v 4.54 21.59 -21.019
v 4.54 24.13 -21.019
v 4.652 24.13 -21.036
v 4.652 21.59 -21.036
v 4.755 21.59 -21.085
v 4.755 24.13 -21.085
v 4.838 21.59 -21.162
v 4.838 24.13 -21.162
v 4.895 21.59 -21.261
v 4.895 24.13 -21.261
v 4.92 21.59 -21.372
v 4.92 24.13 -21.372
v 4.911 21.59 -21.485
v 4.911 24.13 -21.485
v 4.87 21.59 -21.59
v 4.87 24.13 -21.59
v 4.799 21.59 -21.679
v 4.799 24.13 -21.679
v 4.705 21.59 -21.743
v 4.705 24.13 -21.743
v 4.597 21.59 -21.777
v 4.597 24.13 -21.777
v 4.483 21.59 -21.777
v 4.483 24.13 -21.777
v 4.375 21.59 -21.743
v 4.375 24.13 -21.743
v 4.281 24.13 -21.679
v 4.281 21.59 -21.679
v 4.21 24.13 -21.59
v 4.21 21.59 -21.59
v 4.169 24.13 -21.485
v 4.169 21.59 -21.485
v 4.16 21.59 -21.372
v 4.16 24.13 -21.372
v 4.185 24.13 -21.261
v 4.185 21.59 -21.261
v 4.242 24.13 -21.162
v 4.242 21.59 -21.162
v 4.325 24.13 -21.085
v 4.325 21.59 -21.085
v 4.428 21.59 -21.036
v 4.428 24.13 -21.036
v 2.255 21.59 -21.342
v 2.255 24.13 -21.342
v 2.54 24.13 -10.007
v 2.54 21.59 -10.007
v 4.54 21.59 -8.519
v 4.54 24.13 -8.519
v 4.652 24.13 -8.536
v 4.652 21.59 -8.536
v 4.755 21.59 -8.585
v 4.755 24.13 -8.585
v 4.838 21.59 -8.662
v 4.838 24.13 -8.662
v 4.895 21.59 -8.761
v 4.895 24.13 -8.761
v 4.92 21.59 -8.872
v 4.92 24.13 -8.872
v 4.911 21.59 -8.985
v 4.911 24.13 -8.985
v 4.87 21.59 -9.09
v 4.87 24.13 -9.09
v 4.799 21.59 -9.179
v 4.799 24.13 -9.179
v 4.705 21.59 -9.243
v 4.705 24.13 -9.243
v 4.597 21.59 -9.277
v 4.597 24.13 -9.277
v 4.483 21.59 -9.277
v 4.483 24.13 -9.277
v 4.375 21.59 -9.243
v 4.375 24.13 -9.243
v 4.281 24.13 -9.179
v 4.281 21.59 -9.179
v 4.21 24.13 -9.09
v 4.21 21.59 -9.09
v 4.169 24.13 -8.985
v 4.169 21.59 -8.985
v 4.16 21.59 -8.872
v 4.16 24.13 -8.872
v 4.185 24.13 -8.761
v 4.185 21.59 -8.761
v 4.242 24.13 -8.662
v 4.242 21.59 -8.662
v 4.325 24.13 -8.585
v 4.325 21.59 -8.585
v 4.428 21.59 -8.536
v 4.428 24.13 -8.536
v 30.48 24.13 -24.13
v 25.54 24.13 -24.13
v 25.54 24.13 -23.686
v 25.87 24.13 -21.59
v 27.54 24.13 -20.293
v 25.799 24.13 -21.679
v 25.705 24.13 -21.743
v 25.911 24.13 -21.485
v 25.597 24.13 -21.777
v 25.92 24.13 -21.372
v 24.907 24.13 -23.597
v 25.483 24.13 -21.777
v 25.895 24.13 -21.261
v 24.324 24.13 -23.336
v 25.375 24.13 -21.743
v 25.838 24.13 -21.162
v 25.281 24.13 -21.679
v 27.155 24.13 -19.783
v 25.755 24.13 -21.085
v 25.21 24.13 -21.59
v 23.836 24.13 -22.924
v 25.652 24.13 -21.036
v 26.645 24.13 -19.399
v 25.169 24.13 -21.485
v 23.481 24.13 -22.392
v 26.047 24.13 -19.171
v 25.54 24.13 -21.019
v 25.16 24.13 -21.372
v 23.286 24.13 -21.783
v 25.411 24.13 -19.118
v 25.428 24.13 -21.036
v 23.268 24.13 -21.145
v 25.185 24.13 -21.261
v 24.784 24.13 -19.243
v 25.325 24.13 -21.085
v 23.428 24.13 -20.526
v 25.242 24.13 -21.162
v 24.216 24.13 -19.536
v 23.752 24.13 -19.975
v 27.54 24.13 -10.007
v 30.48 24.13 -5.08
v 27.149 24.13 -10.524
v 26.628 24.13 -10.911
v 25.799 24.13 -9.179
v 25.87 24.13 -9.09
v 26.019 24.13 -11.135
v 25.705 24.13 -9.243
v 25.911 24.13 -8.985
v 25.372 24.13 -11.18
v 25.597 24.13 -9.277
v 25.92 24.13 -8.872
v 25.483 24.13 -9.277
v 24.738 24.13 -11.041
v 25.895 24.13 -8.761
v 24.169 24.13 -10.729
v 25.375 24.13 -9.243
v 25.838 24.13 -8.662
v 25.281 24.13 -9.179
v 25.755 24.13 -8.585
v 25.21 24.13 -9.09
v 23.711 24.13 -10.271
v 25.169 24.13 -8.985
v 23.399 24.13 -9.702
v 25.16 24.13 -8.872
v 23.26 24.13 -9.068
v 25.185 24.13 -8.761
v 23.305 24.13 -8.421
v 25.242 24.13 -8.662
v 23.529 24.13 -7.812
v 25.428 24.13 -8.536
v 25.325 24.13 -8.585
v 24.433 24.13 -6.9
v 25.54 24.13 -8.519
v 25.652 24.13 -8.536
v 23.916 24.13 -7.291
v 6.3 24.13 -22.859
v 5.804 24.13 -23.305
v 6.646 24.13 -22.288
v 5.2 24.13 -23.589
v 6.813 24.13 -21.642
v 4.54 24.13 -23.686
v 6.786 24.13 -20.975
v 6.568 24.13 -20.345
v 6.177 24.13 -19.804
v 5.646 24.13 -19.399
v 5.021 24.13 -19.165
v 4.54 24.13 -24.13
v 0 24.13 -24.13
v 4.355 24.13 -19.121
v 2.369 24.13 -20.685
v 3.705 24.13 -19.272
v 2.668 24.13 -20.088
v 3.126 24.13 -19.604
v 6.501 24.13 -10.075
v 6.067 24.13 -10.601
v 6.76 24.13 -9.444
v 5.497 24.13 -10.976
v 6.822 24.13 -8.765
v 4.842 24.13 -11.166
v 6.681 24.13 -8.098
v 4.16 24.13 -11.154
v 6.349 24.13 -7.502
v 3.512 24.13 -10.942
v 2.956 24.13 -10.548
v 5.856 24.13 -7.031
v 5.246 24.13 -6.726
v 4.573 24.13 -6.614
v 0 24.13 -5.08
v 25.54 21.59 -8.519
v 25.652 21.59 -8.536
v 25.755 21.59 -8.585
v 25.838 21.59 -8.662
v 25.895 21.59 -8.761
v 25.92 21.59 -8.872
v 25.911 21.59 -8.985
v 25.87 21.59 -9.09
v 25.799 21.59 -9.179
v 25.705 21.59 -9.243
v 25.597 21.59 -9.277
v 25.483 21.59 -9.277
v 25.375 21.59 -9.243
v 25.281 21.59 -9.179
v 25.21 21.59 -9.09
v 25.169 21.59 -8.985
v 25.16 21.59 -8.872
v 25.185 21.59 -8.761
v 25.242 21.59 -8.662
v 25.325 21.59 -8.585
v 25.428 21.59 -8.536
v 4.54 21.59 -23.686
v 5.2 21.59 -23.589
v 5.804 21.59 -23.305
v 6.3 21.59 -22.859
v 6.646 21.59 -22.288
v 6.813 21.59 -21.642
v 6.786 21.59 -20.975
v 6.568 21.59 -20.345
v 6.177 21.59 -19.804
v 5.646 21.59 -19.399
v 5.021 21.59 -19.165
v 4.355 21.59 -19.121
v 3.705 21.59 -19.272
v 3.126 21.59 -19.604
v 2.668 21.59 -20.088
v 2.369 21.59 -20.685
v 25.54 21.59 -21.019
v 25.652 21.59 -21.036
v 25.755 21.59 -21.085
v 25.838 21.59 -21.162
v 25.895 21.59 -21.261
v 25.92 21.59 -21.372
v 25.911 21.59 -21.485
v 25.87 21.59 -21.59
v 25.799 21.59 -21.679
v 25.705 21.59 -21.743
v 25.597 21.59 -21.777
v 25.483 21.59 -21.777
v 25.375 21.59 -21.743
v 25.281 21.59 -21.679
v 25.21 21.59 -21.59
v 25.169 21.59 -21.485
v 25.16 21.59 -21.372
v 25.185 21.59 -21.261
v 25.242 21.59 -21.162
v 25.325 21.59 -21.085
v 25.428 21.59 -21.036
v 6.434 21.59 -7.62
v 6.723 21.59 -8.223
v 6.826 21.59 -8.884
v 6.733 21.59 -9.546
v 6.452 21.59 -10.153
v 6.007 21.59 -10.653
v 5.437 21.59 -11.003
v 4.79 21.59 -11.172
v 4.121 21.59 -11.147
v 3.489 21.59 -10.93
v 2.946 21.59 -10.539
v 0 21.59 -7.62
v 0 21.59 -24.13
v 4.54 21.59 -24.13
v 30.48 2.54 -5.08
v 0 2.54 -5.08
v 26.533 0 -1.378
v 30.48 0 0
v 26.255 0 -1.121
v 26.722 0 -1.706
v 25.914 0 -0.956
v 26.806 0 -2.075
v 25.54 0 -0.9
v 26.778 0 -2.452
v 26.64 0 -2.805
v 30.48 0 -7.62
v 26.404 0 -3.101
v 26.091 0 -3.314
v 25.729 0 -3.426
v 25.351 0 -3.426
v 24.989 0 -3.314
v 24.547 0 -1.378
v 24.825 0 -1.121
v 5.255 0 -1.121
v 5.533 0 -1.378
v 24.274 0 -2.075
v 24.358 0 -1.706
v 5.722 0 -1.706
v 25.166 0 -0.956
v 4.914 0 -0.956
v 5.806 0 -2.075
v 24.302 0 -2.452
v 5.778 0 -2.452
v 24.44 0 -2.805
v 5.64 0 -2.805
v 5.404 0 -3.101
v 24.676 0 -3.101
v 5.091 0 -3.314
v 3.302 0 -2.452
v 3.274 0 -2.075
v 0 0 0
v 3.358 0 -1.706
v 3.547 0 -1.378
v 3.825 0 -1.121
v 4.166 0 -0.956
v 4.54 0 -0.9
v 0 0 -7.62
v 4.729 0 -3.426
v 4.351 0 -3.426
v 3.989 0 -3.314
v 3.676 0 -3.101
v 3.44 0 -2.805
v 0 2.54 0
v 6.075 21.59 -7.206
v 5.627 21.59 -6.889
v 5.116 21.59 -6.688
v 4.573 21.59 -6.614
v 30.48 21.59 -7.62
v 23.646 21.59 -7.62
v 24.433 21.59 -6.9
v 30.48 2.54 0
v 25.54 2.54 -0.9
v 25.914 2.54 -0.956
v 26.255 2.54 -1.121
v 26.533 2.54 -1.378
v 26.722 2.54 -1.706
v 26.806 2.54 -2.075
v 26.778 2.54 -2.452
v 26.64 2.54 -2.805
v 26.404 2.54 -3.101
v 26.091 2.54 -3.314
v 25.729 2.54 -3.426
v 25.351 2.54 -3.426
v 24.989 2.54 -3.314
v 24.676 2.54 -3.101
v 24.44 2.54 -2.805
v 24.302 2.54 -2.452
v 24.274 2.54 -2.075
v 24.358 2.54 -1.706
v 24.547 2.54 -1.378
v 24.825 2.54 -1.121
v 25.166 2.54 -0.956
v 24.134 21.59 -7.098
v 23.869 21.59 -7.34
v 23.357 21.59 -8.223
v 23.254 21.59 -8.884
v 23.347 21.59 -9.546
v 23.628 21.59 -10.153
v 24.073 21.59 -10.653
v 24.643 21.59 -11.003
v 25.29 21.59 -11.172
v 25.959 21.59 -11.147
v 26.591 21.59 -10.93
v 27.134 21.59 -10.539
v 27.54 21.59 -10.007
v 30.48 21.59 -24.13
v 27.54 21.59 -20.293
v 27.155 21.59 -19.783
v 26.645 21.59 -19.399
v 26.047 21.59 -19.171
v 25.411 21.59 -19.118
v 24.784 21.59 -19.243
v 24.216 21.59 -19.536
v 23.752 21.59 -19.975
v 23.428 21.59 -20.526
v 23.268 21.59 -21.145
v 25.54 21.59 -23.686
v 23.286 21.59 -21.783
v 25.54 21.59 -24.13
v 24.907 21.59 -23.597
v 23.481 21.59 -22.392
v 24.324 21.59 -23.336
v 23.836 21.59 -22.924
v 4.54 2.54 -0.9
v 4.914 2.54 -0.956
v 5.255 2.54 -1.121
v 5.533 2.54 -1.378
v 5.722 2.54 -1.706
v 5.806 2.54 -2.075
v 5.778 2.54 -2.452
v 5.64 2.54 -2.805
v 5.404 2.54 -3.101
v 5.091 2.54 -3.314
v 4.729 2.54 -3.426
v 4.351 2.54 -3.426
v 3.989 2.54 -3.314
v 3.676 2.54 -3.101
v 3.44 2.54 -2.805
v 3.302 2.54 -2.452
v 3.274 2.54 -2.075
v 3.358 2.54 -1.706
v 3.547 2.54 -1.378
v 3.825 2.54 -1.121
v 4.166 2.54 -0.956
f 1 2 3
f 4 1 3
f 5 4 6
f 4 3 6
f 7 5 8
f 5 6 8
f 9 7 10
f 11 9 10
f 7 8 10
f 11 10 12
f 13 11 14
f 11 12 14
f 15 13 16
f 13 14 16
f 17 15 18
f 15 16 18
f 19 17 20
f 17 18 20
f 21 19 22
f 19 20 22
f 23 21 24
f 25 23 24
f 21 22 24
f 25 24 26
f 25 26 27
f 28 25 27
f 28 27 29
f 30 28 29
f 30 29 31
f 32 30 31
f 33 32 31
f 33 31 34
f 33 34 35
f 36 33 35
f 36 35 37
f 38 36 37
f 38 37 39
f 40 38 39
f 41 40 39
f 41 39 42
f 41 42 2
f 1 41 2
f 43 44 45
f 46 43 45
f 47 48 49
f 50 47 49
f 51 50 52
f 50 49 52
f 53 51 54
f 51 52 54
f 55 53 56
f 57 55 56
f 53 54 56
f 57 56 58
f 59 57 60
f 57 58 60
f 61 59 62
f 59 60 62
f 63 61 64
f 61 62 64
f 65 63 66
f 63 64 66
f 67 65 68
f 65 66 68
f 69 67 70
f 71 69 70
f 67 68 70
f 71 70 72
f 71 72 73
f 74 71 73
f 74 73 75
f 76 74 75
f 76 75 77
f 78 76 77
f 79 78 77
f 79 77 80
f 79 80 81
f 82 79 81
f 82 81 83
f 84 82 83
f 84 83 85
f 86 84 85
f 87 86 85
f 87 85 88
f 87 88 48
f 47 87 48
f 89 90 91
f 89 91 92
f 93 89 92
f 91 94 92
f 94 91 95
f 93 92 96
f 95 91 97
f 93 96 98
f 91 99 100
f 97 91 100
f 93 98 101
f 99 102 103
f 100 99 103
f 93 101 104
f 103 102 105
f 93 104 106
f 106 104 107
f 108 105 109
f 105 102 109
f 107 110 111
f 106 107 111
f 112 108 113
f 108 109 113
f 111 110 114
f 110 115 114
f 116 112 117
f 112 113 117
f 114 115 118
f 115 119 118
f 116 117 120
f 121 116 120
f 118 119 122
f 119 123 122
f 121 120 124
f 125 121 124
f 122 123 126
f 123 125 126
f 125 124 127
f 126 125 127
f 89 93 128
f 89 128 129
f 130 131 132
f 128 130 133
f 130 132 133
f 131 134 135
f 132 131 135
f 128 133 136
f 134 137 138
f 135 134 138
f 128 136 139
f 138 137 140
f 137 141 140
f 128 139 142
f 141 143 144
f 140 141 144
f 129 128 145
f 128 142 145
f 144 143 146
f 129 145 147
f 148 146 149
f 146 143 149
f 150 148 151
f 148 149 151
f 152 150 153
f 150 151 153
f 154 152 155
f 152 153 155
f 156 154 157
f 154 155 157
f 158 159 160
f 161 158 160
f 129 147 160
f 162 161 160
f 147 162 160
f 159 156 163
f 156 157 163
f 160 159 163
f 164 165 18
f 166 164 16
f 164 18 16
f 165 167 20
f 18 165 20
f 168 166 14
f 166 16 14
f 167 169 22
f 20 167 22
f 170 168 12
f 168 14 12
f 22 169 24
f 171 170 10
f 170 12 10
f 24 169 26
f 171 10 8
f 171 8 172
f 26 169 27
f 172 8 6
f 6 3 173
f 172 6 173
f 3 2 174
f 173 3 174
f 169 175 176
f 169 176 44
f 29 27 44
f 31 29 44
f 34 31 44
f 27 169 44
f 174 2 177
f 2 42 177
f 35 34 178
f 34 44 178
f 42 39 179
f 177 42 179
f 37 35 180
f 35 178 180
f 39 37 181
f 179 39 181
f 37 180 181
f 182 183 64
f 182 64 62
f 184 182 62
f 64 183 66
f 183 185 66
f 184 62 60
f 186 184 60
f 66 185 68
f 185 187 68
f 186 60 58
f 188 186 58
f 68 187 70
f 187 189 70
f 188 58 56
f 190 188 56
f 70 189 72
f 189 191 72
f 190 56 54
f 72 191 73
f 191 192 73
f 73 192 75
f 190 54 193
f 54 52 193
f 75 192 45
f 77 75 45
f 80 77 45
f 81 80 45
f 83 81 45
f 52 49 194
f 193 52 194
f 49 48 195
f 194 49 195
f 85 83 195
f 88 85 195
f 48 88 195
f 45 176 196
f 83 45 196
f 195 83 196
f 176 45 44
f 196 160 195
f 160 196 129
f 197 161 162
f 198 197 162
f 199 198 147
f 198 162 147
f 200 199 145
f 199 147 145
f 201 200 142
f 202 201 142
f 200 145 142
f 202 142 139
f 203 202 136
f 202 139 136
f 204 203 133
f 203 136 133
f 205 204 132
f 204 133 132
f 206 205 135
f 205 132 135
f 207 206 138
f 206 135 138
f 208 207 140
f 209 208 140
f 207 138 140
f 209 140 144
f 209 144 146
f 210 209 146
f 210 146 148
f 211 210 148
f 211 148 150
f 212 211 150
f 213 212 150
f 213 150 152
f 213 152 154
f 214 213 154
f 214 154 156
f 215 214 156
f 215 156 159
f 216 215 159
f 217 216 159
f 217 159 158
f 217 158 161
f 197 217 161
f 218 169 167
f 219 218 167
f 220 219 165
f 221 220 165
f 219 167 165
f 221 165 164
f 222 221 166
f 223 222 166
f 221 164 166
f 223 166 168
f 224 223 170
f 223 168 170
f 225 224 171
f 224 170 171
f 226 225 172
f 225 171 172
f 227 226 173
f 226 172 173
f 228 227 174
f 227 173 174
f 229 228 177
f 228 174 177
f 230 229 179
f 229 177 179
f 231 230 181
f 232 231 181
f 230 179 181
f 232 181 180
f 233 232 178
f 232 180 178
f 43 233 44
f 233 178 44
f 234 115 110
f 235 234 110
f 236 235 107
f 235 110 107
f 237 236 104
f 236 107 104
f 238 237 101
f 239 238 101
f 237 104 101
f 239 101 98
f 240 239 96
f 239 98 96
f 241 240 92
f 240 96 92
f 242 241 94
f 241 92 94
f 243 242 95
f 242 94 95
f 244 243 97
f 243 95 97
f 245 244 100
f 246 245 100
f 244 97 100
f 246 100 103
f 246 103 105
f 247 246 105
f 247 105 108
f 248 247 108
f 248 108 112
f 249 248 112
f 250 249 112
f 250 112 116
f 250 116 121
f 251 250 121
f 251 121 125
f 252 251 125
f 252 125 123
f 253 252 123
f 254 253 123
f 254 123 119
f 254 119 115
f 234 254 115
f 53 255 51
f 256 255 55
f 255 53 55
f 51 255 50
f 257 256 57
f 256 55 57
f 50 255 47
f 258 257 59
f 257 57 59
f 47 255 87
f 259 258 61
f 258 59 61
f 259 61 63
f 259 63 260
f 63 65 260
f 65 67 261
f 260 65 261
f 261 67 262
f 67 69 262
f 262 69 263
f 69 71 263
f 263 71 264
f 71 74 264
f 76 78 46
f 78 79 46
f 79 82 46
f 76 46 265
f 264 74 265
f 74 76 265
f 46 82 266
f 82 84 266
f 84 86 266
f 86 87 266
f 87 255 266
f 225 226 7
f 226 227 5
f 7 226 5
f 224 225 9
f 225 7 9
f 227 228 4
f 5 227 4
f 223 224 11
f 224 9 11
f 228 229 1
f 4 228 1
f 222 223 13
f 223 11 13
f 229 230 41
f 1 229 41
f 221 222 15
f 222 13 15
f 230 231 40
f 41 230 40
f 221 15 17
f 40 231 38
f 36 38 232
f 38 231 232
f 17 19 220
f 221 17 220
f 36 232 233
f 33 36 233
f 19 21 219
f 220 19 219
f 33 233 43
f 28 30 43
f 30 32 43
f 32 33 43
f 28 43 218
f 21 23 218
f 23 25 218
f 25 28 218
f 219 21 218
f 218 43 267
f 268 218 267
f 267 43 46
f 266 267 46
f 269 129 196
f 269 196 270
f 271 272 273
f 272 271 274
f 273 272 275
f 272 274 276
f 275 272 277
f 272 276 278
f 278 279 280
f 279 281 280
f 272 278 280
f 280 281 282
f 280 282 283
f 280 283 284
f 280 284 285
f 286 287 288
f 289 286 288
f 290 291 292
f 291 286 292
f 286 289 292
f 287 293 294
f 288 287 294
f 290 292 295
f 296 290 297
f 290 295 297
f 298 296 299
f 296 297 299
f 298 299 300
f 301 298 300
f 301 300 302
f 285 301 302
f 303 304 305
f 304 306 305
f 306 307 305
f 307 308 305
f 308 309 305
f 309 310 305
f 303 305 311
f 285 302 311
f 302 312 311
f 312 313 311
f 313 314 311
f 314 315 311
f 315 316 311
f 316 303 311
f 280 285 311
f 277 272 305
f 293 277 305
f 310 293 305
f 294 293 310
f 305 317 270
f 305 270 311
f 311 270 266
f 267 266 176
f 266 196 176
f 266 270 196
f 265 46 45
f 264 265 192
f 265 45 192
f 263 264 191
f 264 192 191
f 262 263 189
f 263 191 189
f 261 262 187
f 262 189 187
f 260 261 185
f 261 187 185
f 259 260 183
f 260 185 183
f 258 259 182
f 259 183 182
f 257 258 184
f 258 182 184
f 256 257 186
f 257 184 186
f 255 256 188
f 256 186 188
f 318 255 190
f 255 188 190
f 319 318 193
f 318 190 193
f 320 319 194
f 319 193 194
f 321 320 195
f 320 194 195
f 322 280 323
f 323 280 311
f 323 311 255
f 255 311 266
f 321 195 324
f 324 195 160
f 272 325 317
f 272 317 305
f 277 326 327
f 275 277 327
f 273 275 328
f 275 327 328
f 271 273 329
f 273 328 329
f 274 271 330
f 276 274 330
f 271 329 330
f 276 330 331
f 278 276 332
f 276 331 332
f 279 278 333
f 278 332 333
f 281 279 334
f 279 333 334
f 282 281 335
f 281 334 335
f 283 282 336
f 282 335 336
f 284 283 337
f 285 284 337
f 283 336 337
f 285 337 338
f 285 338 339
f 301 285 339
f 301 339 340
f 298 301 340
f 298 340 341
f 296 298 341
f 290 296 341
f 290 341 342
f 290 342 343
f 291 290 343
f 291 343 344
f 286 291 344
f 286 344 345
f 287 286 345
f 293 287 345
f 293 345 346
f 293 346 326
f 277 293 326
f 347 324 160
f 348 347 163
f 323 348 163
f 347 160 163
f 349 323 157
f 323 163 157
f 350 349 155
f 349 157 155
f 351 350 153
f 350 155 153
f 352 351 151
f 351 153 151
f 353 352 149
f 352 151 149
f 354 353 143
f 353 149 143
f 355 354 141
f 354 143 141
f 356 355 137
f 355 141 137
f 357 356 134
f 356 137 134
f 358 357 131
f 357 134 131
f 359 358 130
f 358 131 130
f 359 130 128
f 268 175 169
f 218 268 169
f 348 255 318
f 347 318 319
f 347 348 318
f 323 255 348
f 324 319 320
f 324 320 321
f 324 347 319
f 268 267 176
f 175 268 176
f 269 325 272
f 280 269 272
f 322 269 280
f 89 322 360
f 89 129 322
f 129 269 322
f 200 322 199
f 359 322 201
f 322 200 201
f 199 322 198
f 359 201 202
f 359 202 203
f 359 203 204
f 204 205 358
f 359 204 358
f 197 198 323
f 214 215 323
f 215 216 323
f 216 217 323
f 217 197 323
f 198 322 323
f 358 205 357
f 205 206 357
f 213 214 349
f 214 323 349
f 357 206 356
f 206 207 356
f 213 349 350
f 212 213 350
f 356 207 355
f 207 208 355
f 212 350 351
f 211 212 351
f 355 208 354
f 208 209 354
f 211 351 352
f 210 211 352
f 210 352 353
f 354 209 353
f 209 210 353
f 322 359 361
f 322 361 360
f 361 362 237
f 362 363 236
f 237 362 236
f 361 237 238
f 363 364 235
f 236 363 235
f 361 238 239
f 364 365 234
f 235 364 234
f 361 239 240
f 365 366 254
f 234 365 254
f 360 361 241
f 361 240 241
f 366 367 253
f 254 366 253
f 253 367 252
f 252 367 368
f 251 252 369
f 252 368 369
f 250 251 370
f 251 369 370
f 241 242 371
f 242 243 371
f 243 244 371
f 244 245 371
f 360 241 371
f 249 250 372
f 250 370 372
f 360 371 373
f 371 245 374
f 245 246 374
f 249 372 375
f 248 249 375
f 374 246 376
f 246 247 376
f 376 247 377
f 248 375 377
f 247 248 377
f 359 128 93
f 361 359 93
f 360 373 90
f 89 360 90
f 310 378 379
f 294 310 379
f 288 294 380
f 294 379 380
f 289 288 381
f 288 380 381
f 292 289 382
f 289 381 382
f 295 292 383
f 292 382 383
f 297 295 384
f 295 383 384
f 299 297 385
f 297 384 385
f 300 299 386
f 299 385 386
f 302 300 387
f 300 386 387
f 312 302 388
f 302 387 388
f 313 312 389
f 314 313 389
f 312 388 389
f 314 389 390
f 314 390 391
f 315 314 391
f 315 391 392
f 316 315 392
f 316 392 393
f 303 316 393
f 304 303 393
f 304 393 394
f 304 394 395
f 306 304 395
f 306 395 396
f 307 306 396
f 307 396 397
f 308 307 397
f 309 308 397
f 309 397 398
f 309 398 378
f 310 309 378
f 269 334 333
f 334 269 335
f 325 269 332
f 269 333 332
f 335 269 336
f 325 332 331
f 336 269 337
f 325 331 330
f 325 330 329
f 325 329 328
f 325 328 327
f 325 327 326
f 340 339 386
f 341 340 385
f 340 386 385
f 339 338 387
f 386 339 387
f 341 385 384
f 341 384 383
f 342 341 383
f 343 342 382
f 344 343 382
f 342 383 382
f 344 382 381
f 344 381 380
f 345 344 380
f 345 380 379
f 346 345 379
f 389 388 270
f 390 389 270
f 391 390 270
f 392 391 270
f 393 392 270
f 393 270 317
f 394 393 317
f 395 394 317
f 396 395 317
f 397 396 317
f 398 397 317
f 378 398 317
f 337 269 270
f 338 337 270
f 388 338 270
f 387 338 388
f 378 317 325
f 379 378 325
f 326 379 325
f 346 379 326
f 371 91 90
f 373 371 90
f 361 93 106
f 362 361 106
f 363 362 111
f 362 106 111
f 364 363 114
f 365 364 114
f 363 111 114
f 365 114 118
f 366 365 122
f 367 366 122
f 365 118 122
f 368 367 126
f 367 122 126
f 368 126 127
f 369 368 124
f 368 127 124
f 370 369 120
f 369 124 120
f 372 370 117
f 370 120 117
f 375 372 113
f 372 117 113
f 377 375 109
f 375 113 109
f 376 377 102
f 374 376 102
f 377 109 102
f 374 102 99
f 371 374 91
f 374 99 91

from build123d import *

# Parameters (mm, degrees)
BOSS_EXTRUDE1_DEPTH = 30.48
CUT_EXTRUDE1_DEPTH  = 2.54
SKETCH3_R           = 0.381
SKETCH3_R_2         = 1.27
CUT_EXTRUDE2_DEPTH  = 30.48


with BuildPart() as part:
    # Sketch1 → Boss-Extrude1 (new body)
    with BuildSketch(Plane(origin=(0, 0, 0), x_dir=(0, 0, -1), z_dir=(1, 0, 0))):
        Polygon((0, 0), (7.62, 0), (7.62, 21.59), (24.13, 21.59), (24.13, 24.13), (5.08, 24.13), (5.08, 2.54), (0, 2.54), align=None)
    extrude(amount=BOSS_EXTRUDE1_DEPTH)

    # Sketch2 → Cut-Extrude1 (cut)
    with BuildSketch(Plane(origin=(0, 24.13, 0), x_dir=(1, 0, 0), z_dir=(0, 1, 0))):
        with BuildLine():
            Line((2.254723608, 21.342486419), (2.54, 10.007156719))
            ThreePointArc((2.54, 10.007156719), (6.500958303, 10.074920649), (4.572889679, 6.614236611))
            Line((4.572889679, 6.614236611), (24.432843281, 6.9))
            ThreePointArc((24.432843281, 6.9), (23.923553898, 10.516446102), (27.54, 10.007156719))
            Line((27.54, 10.007156719), (27.54, 20.292843281))
            ThreePointArc((27.54, 20.292843281), (23.570640173, 20.2392167), (25.54, 23.686))
            Line((25.54, 23.686), (25.54, 25.581417478))
            Line((25.54, 25.581417478), (4.54, 25.84529962))
            Line((4.54, 25.84529962), (4.54, 23.686))
            ThreePointArc((4.54, 23.686), (6.176653911, 19.804017551), (2.254723608, 21.342486419))
        make_face()
    extrude(amount=-CUT_EXTRUDE1_DEPTH, mode=Mode.SUBTRACT)

    # Sketch3 → Cut-Extrude2 (cut)
    with BuildSketch(Plane(origin=(0, 24.13, 0), x_dir=(1, 0, 0), z_dir=(0, 1, 0))):
        with Locations(Location((4.54, 8.9, 0), (0, 0, 270))):
            Circle(SKETCH3_R)
        with Locations(Location((4.54, 21.4, 0), (0, 0, 270))):
            Circle(SKETCH3_R)
        with Locations(Location((25.54, 21.4, 0), (0, 0, 270))):
            Circle(SKETCH3_R)
        with Locations(Location((25.54, 8.9, 0), (0, 0, 270))):
            Circle(SKETCH3_R)
        with Locations(Location((4.54, 2.169828056, 0), (0, 0, 270))):
            Circle(SKETCH3_R_2)
        with Locations(Location((25.54, 2.169828056, 0), (0, 0, 270))):
            Circle(SKETCH3_R_2)
    extrude(amount=-CUT_EXTRUDE2_DEPTH, mode=Mode.SUBTRACT)


solid = part.part
